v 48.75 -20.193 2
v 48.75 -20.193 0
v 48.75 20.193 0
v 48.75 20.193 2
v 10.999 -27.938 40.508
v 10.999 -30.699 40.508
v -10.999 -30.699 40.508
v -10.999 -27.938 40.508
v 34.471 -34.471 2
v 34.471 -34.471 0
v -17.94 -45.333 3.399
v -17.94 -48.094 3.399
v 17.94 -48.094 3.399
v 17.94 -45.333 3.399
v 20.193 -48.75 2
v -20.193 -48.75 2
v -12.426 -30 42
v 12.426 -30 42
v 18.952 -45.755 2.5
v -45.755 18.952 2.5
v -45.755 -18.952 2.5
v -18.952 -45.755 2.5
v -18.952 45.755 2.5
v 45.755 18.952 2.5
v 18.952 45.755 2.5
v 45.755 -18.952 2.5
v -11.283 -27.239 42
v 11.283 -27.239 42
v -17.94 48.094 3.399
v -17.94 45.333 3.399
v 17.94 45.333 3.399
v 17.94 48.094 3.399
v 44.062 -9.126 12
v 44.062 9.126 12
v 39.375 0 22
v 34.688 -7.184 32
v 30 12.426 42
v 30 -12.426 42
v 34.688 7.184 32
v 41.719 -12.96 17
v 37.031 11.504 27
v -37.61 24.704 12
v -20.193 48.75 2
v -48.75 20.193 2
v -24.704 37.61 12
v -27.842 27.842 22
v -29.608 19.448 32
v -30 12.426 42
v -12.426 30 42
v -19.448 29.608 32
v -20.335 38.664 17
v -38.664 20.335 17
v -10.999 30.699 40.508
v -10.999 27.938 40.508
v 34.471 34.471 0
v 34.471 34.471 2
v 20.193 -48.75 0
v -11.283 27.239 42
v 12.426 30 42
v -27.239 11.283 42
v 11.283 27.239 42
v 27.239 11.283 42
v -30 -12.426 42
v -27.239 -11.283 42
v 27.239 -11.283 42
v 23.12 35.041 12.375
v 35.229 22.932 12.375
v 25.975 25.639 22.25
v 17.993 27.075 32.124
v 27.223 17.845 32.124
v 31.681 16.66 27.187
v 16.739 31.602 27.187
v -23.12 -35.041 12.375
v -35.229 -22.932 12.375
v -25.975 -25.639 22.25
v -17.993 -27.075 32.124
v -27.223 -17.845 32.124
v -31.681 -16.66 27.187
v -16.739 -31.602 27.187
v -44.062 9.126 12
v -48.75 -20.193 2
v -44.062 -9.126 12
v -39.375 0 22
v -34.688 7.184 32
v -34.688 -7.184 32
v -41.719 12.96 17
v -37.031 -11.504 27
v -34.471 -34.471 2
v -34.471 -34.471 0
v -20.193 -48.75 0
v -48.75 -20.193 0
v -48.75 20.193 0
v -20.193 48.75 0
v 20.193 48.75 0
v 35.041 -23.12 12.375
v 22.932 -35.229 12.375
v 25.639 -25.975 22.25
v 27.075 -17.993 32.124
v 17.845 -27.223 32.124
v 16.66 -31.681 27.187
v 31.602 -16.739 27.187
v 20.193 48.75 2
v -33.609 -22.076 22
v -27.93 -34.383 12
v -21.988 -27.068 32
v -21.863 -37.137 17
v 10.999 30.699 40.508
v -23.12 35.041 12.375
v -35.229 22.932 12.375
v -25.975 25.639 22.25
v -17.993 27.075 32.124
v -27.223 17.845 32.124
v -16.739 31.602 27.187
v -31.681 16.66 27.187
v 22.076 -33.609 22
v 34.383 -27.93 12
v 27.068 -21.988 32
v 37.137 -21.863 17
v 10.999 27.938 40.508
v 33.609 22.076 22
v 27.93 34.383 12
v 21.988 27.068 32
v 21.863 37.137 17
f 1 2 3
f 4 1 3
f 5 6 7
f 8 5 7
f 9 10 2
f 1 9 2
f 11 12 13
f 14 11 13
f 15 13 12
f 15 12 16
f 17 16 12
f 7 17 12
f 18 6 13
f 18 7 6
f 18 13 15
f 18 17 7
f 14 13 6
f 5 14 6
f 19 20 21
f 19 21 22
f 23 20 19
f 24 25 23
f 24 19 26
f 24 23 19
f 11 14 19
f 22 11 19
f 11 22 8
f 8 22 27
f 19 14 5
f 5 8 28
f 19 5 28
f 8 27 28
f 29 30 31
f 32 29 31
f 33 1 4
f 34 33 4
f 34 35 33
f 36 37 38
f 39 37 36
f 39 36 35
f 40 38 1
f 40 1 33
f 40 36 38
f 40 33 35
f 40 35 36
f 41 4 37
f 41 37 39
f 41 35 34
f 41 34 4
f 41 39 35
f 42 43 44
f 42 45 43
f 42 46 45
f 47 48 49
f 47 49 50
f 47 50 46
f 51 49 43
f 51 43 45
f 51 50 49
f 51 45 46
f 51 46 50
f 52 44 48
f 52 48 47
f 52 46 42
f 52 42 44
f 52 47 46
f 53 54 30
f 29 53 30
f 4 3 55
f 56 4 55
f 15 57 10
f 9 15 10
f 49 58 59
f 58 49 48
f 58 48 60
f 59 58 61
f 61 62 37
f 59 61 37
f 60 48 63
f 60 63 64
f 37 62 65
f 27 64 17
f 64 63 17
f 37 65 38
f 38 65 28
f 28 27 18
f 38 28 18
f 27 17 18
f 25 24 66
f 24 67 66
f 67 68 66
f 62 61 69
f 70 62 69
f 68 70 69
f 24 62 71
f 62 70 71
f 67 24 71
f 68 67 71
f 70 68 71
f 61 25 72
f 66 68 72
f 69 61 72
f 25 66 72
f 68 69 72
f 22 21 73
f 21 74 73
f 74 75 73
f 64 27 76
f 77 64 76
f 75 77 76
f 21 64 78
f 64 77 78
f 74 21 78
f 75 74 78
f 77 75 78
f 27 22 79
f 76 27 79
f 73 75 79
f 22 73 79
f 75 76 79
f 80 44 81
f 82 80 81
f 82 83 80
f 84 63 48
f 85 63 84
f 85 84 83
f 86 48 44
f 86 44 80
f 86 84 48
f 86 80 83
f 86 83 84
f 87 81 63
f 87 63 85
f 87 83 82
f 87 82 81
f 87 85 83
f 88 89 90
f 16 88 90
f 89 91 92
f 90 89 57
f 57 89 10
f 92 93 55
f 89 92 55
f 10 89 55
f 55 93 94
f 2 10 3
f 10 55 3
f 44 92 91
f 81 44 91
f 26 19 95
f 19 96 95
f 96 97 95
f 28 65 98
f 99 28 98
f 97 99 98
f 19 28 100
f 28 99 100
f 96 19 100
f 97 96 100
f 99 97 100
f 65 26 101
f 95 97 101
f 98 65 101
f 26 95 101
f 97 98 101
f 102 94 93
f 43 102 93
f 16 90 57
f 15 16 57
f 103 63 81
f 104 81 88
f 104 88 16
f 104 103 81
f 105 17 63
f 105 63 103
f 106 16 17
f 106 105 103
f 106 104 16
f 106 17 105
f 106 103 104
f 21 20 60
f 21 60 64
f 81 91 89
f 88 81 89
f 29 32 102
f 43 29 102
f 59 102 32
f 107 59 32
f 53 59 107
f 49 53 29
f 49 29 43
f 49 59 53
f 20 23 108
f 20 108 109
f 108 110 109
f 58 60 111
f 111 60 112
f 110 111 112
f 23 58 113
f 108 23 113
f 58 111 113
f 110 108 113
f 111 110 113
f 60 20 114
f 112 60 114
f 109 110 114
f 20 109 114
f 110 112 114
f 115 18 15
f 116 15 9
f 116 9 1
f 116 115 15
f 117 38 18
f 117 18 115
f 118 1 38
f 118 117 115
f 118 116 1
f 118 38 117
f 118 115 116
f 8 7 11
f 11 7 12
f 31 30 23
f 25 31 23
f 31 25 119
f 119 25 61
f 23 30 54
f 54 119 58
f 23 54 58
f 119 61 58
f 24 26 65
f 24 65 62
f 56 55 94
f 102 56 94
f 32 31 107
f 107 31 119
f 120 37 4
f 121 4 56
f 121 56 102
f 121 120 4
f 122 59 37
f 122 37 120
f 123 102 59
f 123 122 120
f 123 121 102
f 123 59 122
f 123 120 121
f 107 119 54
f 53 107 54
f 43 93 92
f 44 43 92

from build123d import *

# Parameters (mm, degrees)
F1_DEPTH = 2
F6_T     = -2.5
F8_DEPTH = 84.8


with BuildPart() as f1:
    # F0 (on Top) → F1 (new body)
    with BuildSketch(Plane.XY):
        with BuildLine():
            ThreePointArc((34.4714555828, -34.4714555828), (45.0391272099, -18.6558173278), (48.75, 0))
            ThreePointArc((48.75, 0), (45.0391271917, 18.6558173718), (34.4714555154, 34.4714556502))
            ThreePointArc((34.4714555154, 34.4714556502), (18.655817355, 45.0391271987), (1.543e-07, 48.75))
            ThreePointArc((1.543e-07, 48.75), (-18.6558172398, 45.0391272464), (-34.4714555572, 34.4714556085))
            ThreePointArc((-34.4714555572, 34.4714556085), (-45.039127203, 18.6558173446), (-48.75, 0))
            ThreePointArc((-48.75, 0), (-45.0391272099, -18.6558173278), (-34.4714555828, -34.4714555828))
            ThreePointArc((-34.4714555828, -34.4714555828), (-18.6558173238, -45.0391272116), (8.6e-09, -48.75))
            ThreePointArc((8.6e-09, -48.75), (18.6558173318, -45.0391272083), (34.4714555828, -34.4714555828))
        make_face()
        with BuildLine():
            Line((48.75, -20.1929111657), (48.75, 0))
            ThreePointArc((48.75, 0), (45.0391272099, -18.6558173278), (34.4714555828, -34.4714555828))
            Line((34.4714555828, -34.4714555828), (48.75, -20.1929111657))
        make_face()
        with BuildLine():
            ThreePointArc((34.4714555154, 34.4714556502), (45.0391271917, 18.6558173718), (48.75, 0))
            Line((48.75, 0), (48.75, 20.1929111657))
            Line((48.75, 20.1929111657), (34.4714555154, 34.4714556502))
        make_face()
        with BuildLine():
            ThreePointArc((1.543e-07, 48.75), (18.655817355, 45.0391271987), (34.4714555154, 34.4714556502))
            Line((34.4714555154, 34.4714556502), (20.1929111657, 48.75))
            Line((20.1929111657, 48.75), (1.543e-07, 48.75))
        make_face()
        with BuildLine():
            Line((20.1929111657, -48.75), (34.4714555828, -34.4714555828))
            ThreePointArc((34.4714555828, -34.4714555828), (18.6558173318, -45.0391272083), (8.6e-09, -48.75))
            Line((8.6e-09, -48.75), (20.1929111657, -48.75))
        make_face()
        with BuildLine():
            ThreePointArc((-34.4714555572, 34.4714556085), (-18.6558172398, 45.0391272464), (1.543e-07, 48.75))
            Line((1.543e-07, 48.75), (-20.1929111657, 48.75))
            Line((-20.1929111657, 48.75), (-34.4714555572, 34.4714556085))
        make_face()
        with BuildLine():
            Line((-20.1929111657, -48.75), (8.6e-09, -48.75))
            ThreePointArc((8.6e-09, -48.75), (-18.6558173238, -45.0391272116), (-34.4714555828, -34.4714555828))
            Line((-34.4714555828, -34.4714555828), (-20.1929111657, -48.75))
        make_face()
        with BuildLine():
            ThreePointArc((-48.75, 0), (-45.039127203, 18.6558173446), (-34.4714555572, 34.4714556085))
            Line((-34.4714555572, 34.4714556085), (-48.75, 20.1929111657))
            Line((-48.75, 20.1929111657), (-48.75, 0))
        make_face()
        with BuildLine():
            Line((-48.75, -20.1929111657), (-34.4714555828, -34.4714555828))
            ThreePointArc((-34.4714555828, -34.4714555828), (-45.0391272099, -18.6558173278), (-48.75, 0))
            Line((-48.75, 0), (-48.75, -20.1929111657))
        make_face()
    extrude(amount=F1_DEPTH)

    # F4 (on face) → F5 section 0
    with BuildSketch(Plane.XY.offset(2)):
        Polygon((-48.75, 20.1929111657), (-48.75, -20.1929111657), (-20.1929111657, -48.75), (20.1929111657, -48.75), (48.75, -20.1929111657), (48.75, 20.1929111657), (20.1929111657, 48.75), (-20.1929111657, 48.75), align=None)
    # F3 (on offset) → F5 section 1
    with BuildSketch(Plane.XY.offset(42)):
        Polygon((-30, 12.4264068712), (-30, -12.4264068712), (-12.4264068712, -30), (12.4264068712, -30), (30, -12.4264068712), (30, 12.4264068712), (12.4264068712, 30), (-12.4264068712, 30), align=None)
    loft()

    # F6
    f6_openings = [f1.faces().sort_by_distance(p)[0] for p in [
        (0, 0, 42),
    ]]
    offset(amount=F6_T, openings=f6_openings, kind=Kind.INTERSECTION)

    # F7 (on Front) → F8 (cut, symmetric)
    with BuildSketch(Plane.XZ):
        Polygon((0, 3.399281064), (17.9396793246, 3.399281064), (10.999482125, 40.508095175), (0, 40.508095175), (-10.999482125, 40.508095175), (-17.9396793246, 3.399281064), align=None)
    extrude(amount=F8_DEPTH, both=True, mode=Mode.SUBTRACT)


solid = f1.part
